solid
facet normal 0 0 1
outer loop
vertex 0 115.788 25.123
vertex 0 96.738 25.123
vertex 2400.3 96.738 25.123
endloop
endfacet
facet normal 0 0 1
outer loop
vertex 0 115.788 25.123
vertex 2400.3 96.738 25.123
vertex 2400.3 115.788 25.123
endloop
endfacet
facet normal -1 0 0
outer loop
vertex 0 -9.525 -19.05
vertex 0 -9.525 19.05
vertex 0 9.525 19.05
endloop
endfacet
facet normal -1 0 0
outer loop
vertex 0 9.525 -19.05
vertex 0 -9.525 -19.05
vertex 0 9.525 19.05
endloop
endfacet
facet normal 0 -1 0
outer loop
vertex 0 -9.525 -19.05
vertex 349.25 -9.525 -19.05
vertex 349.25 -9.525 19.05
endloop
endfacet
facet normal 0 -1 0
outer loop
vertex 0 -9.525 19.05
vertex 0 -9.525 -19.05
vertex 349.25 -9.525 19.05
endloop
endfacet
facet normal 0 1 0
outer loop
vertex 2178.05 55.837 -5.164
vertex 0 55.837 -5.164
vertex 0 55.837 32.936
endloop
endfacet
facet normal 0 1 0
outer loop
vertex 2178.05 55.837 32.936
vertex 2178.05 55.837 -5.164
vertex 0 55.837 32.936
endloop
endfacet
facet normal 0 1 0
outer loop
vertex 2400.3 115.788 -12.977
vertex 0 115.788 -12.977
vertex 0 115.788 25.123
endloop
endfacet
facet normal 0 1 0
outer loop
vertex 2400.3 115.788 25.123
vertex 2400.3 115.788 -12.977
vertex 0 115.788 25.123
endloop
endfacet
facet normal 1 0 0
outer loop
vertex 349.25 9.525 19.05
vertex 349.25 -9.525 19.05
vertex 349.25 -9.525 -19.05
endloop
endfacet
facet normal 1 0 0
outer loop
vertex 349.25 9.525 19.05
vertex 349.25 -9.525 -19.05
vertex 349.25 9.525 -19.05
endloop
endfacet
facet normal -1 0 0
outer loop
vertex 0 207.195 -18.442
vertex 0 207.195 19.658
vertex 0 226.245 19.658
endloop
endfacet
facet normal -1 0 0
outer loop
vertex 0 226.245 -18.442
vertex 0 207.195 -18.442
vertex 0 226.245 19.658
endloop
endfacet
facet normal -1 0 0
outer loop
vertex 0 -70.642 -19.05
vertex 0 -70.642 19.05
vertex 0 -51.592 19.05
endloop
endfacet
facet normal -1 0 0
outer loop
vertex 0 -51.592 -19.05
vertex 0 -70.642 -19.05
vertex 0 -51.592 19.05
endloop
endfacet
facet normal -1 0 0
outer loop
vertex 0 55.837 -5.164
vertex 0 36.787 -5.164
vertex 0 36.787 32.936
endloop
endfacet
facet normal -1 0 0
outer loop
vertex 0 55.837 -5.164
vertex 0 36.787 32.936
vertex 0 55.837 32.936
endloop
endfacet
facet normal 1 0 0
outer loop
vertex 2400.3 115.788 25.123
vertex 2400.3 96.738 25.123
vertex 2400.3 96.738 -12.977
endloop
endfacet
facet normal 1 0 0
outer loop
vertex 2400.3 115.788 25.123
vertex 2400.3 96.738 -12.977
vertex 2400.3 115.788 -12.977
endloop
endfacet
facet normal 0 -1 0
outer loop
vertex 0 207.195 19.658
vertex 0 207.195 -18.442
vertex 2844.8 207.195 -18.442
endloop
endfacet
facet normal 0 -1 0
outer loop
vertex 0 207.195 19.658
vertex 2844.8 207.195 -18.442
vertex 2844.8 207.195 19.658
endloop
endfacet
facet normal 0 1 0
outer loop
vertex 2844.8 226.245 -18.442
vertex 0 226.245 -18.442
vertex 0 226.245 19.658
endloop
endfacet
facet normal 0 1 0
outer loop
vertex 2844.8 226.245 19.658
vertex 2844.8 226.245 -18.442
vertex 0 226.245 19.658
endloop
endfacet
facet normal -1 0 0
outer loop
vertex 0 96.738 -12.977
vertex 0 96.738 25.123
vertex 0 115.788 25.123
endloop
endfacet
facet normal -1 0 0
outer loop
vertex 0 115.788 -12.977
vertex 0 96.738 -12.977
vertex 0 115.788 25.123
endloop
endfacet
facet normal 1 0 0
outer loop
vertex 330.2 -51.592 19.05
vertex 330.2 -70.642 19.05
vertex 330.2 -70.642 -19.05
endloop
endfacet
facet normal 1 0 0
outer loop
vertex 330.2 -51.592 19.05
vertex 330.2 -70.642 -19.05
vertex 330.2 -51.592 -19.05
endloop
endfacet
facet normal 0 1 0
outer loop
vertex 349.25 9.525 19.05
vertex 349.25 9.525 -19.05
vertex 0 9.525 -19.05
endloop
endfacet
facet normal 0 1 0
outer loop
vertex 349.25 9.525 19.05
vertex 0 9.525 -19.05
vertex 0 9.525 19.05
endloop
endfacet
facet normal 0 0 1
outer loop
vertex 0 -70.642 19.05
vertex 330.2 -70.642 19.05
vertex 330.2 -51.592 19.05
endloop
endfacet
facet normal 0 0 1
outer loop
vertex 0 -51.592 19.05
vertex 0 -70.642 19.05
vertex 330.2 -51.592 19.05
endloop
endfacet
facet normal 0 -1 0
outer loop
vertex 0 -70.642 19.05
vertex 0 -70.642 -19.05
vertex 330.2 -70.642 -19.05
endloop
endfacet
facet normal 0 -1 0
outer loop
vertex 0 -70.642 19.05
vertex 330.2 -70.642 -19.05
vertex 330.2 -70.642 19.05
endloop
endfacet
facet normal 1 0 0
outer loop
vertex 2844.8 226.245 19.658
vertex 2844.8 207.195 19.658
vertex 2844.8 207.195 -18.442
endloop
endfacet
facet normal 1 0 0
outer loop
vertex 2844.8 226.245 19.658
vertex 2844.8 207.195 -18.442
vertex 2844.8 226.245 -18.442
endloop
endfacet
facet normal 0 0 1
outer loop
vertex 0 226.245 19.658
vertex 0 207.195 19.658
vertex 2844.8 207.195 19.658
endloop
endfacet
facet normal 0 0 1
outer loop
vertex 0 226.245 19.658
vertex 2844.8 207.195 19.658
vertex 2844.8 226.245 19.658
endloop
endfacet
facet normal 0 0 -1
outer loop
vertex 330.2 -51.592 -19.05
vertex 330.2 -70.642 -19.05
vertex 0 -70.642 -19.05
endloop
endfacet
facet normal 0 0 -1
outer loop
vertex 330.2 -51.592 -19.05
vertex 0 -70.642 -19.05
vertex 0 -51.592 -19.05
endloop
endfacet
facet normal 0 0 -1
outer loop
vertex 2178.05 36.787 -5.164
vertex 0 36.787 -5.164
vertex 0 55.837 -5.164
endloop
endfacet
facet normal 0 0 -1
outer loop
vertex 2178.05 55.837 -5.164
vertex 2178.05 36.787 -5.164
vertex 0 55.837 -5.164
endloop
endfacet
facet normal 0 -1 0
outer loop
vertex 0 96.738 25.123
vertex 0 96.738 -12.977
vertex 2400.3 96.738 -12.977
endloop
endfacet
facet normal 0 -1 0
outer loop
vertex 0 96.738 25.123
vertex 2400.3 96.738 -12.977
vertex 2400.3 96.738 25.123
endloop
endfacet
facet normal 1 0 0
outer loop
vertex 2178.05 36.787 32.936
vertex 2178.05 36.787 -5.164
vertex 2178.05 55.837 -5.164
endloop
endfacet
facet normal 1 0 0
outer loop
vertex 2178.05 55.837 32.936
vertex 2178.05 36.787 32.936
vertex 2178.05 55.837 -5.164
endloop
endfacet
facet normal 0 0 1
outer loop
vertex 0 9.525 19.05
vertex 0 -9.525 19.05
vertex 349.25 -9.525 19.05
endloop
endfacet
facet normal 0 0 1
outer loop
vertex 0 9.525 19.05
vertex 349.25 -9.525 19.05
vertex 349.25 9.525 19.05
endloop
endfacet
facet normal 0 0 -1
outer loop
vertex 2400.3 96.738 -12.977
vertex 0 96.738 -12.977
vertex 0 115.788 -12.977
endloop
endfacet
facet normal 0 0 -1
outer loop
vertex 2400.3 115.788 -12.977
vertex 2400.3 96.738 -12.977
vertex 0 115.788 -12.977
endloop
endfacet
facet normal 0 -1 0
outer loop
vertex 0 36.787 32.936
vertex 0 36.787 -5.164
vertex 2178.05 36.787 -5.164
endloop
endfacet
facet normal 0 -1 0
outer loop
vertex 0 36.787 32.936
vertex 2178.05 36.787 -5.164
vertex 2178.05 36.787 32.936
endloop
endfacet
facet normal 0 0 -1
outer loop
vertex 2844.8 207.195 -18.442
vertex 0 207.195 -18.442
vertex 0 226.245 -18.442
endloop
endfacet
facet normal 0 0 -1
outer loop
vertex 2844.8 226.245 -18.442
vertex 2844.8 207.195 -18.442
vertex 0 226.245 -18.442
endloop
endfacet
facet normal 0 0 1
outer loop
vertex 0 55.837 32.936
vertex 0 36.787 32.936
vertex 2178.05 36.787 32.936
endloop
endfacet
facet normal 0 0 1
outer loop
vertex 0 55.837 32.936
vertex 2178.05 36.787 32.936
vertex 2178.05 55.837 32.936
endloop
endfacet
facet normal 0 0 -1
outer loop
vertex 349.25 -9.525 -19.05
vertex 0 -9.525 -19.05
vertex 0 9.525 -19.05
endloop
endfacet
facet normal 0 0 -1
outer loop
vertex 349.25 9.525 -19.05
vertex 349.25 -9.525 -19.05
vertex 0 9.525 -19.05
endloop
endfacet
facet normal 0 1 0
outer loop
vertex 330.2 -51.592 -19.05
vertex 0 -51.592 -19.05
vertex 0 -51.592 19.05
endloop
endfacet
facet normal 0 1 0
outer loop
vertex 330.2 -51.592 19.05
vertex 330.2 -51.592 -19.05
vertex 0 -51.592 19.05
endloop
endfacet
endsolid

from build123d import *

# Parameters (mm, degrees)
F0_W     = 19.05
F0_H     = 38.1
F1_DEPTH = 349.25
F2_W     = 19.05
F2_H     = 38.1
F3_DEPTH = 2400.3
F4_W     = 19.05
F4_H     = 38.1
F5_DEPTH = 2844.8
F6_W     = 19.05
F6_H     = 38.1
F7_DEPTH = 2178.05
F8_W     = 19.05
F8_H     = 38.1
F9_DEPTH = 330.2


with BuildPart() as f1:
    # F0 (on Right) → F1 (new body)
    with BuildSketch(Plane.YZ):
        Rectangle(F0_W, F0_H)
    extrude(amount=F1_DEPTH)


with BuildPart() as f3:
    # F2 (on Right) → F3 (new body)
    with BuildSketch(Plane.YZ):
        with Locations((106.263376, 6.072903)):
            Rectangle(F2_W, F2_H)
    extrude(amount=F3_DEPTH)


with BuildPart() as f5:
    # F4 (on Right) → F5 (new body)
    with BuildSketch(Plane.YZ):
        with Locations((216.719954, 0.60765)):
            Rectangle(F4_W, F4_H)
    extrude(amount=F5_DEPTH)


with BuildPart() as f7:
    # F6 (on Right) → F7 (new body)
    with BuildSketch(Plane.YZ):
        with Locations((46.31238, 13.886165)):
            Rectangle(F6_W, F6_H)
    extrude(amount=F7_DEPTH)


with BuildPart() as f9:
    # F8 (on Right) → F9 (new body)
    with BuildSketch(Plane.YZ):
        with Locations((-61.117172, 0)):
            Rectangle(F8_W, F8_H)
    extrude(amount=F9_DEPTH)


solid = Compound([f1.part, f3.part, f5.part, f7.part, f9.part])
